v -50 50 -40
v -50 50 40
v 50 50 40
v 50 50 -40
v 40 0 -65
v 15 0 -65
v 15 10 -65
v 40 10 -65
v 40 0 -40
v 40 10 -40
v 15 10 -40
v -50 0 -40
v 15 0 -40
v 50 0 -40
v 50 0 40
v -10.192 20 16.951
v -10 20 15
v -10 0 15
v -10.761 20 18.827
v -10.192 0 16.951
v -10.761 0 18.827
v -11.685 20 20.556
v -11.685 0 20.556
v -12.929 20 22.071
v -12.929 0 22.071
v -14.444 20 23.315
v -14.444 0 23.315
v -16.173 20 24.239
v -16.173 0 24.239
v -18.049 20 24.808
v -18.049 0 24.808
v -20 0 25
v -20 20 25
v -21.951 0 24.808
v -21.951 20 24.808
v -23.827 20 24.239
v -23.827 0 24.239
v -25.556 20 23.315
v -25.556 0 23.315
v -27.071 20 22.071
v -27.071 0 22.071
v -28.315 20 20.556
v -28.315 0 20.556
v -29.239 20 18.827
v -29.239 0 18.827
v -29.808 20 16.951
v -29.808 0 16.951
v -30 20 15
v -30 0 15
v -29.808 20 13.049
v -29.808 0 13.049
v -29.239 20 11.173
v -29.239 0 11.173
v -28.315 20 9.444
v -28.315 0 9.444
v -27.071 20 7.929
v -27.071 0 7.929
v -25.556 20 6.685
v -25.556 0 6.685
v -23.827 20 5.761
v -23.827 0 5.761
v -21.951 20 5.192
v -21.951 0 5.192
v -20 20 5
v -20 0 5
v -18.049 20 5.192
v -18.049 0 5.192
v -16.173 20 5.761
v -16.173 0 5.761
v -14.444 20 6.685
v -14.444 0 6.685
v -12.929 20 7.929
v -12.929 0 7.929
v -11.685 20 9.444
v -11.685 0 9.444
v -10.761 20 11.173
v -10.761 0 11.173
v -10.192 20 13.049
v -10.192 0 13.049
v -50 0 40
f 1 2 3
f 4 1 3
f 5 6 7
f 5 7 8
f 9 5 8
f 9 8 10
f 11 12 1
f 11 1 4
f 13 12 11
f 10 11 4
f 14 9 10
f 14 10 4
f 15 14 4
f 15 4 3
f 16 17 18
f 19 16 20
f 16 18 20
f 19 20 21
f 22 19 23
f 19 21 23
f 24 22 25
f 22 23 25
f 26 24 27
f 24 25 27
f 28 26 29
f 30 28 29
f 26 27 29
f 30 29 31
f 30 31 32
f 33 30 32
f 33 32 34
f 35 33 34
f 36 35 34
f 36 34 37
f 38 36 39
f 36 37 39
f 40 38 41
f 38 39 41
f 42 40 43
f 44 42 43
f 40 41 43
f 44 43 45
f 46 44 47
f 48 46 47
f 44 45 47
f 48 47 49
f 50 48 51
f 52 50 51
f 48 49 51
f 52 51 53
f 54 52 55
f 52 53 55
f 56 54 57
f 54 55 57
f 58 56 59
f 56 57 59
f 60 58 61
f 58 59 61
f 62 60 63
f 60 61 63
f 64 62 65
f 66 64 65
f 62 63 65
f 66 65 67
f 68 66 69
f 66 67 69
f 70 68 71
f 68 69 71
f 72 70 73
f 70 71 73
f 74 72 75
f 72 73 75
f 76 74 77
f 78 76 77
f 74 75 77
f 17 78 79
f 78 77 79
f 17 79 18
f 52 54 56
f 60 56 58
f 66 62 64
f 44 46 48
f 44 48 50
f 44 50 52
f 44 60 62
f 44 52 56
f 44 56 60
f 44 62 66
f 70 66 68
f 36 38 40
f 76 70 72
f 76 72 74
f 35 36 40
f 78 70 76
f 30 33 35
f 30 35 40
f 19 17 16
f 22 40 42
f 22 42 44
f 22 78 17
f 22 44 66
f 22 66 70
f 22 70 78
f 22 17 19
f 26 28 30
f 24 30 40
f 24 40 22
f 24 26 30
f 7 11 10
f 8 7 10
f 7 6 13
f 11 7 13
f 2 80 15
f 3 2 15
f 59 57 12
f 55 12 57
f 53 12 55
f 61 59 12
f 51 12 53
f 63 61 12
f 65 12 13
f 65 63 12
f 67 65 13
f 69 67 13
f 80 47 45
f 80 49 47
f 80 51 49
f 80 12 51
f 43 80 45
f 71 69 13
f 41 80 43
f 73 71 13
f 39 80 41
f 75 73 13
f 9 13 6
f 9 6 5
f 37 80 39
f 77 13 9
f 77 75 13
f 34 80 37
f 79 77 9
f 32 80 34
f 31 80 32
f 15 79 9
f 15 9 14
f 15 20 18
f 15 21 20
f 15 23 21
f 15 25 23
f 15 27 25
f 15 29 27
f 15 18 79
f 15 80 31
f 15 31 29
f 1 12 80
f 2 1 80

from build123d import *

# Parameters (mm, degrees)
SKETCH001_W  = 100
SKETCH001_H  = 80
PAD_DEPTH    = 50
SKETCH_R     = 10
POCKET_DEPTH = 20
SKETCH002_W  = 25
SKETCH002_H  = 50
PAD001_DEPTH = 10


with BuildPart() as part:
    # Sketch001 → Pad (new body)
    with BuildSketch(Plane.XZ):
        Rectangle(SKETCH001_W, SKETCH001_H)
    extrude(amount=-PAD_DEPTH)

    # Sketch → Pocket (cut)
    with BuildSketch(Plane.XZ):
        with Locations((-20, 15)):
            Circle(SKETCH_R)
    extrude(amount=-POCKET_DEPTH, mode=Mode.SUBTRACT)

    # Sketch002 → Pad001 (join)
    with BuildSketch(Plane.XZ):
        with Locations((27.5, -40)):
            Rectangle(SKETCH002_W, SKETCH002_H)
    extrude(amount=-PAD001_DEPTH)


solid = part.part
